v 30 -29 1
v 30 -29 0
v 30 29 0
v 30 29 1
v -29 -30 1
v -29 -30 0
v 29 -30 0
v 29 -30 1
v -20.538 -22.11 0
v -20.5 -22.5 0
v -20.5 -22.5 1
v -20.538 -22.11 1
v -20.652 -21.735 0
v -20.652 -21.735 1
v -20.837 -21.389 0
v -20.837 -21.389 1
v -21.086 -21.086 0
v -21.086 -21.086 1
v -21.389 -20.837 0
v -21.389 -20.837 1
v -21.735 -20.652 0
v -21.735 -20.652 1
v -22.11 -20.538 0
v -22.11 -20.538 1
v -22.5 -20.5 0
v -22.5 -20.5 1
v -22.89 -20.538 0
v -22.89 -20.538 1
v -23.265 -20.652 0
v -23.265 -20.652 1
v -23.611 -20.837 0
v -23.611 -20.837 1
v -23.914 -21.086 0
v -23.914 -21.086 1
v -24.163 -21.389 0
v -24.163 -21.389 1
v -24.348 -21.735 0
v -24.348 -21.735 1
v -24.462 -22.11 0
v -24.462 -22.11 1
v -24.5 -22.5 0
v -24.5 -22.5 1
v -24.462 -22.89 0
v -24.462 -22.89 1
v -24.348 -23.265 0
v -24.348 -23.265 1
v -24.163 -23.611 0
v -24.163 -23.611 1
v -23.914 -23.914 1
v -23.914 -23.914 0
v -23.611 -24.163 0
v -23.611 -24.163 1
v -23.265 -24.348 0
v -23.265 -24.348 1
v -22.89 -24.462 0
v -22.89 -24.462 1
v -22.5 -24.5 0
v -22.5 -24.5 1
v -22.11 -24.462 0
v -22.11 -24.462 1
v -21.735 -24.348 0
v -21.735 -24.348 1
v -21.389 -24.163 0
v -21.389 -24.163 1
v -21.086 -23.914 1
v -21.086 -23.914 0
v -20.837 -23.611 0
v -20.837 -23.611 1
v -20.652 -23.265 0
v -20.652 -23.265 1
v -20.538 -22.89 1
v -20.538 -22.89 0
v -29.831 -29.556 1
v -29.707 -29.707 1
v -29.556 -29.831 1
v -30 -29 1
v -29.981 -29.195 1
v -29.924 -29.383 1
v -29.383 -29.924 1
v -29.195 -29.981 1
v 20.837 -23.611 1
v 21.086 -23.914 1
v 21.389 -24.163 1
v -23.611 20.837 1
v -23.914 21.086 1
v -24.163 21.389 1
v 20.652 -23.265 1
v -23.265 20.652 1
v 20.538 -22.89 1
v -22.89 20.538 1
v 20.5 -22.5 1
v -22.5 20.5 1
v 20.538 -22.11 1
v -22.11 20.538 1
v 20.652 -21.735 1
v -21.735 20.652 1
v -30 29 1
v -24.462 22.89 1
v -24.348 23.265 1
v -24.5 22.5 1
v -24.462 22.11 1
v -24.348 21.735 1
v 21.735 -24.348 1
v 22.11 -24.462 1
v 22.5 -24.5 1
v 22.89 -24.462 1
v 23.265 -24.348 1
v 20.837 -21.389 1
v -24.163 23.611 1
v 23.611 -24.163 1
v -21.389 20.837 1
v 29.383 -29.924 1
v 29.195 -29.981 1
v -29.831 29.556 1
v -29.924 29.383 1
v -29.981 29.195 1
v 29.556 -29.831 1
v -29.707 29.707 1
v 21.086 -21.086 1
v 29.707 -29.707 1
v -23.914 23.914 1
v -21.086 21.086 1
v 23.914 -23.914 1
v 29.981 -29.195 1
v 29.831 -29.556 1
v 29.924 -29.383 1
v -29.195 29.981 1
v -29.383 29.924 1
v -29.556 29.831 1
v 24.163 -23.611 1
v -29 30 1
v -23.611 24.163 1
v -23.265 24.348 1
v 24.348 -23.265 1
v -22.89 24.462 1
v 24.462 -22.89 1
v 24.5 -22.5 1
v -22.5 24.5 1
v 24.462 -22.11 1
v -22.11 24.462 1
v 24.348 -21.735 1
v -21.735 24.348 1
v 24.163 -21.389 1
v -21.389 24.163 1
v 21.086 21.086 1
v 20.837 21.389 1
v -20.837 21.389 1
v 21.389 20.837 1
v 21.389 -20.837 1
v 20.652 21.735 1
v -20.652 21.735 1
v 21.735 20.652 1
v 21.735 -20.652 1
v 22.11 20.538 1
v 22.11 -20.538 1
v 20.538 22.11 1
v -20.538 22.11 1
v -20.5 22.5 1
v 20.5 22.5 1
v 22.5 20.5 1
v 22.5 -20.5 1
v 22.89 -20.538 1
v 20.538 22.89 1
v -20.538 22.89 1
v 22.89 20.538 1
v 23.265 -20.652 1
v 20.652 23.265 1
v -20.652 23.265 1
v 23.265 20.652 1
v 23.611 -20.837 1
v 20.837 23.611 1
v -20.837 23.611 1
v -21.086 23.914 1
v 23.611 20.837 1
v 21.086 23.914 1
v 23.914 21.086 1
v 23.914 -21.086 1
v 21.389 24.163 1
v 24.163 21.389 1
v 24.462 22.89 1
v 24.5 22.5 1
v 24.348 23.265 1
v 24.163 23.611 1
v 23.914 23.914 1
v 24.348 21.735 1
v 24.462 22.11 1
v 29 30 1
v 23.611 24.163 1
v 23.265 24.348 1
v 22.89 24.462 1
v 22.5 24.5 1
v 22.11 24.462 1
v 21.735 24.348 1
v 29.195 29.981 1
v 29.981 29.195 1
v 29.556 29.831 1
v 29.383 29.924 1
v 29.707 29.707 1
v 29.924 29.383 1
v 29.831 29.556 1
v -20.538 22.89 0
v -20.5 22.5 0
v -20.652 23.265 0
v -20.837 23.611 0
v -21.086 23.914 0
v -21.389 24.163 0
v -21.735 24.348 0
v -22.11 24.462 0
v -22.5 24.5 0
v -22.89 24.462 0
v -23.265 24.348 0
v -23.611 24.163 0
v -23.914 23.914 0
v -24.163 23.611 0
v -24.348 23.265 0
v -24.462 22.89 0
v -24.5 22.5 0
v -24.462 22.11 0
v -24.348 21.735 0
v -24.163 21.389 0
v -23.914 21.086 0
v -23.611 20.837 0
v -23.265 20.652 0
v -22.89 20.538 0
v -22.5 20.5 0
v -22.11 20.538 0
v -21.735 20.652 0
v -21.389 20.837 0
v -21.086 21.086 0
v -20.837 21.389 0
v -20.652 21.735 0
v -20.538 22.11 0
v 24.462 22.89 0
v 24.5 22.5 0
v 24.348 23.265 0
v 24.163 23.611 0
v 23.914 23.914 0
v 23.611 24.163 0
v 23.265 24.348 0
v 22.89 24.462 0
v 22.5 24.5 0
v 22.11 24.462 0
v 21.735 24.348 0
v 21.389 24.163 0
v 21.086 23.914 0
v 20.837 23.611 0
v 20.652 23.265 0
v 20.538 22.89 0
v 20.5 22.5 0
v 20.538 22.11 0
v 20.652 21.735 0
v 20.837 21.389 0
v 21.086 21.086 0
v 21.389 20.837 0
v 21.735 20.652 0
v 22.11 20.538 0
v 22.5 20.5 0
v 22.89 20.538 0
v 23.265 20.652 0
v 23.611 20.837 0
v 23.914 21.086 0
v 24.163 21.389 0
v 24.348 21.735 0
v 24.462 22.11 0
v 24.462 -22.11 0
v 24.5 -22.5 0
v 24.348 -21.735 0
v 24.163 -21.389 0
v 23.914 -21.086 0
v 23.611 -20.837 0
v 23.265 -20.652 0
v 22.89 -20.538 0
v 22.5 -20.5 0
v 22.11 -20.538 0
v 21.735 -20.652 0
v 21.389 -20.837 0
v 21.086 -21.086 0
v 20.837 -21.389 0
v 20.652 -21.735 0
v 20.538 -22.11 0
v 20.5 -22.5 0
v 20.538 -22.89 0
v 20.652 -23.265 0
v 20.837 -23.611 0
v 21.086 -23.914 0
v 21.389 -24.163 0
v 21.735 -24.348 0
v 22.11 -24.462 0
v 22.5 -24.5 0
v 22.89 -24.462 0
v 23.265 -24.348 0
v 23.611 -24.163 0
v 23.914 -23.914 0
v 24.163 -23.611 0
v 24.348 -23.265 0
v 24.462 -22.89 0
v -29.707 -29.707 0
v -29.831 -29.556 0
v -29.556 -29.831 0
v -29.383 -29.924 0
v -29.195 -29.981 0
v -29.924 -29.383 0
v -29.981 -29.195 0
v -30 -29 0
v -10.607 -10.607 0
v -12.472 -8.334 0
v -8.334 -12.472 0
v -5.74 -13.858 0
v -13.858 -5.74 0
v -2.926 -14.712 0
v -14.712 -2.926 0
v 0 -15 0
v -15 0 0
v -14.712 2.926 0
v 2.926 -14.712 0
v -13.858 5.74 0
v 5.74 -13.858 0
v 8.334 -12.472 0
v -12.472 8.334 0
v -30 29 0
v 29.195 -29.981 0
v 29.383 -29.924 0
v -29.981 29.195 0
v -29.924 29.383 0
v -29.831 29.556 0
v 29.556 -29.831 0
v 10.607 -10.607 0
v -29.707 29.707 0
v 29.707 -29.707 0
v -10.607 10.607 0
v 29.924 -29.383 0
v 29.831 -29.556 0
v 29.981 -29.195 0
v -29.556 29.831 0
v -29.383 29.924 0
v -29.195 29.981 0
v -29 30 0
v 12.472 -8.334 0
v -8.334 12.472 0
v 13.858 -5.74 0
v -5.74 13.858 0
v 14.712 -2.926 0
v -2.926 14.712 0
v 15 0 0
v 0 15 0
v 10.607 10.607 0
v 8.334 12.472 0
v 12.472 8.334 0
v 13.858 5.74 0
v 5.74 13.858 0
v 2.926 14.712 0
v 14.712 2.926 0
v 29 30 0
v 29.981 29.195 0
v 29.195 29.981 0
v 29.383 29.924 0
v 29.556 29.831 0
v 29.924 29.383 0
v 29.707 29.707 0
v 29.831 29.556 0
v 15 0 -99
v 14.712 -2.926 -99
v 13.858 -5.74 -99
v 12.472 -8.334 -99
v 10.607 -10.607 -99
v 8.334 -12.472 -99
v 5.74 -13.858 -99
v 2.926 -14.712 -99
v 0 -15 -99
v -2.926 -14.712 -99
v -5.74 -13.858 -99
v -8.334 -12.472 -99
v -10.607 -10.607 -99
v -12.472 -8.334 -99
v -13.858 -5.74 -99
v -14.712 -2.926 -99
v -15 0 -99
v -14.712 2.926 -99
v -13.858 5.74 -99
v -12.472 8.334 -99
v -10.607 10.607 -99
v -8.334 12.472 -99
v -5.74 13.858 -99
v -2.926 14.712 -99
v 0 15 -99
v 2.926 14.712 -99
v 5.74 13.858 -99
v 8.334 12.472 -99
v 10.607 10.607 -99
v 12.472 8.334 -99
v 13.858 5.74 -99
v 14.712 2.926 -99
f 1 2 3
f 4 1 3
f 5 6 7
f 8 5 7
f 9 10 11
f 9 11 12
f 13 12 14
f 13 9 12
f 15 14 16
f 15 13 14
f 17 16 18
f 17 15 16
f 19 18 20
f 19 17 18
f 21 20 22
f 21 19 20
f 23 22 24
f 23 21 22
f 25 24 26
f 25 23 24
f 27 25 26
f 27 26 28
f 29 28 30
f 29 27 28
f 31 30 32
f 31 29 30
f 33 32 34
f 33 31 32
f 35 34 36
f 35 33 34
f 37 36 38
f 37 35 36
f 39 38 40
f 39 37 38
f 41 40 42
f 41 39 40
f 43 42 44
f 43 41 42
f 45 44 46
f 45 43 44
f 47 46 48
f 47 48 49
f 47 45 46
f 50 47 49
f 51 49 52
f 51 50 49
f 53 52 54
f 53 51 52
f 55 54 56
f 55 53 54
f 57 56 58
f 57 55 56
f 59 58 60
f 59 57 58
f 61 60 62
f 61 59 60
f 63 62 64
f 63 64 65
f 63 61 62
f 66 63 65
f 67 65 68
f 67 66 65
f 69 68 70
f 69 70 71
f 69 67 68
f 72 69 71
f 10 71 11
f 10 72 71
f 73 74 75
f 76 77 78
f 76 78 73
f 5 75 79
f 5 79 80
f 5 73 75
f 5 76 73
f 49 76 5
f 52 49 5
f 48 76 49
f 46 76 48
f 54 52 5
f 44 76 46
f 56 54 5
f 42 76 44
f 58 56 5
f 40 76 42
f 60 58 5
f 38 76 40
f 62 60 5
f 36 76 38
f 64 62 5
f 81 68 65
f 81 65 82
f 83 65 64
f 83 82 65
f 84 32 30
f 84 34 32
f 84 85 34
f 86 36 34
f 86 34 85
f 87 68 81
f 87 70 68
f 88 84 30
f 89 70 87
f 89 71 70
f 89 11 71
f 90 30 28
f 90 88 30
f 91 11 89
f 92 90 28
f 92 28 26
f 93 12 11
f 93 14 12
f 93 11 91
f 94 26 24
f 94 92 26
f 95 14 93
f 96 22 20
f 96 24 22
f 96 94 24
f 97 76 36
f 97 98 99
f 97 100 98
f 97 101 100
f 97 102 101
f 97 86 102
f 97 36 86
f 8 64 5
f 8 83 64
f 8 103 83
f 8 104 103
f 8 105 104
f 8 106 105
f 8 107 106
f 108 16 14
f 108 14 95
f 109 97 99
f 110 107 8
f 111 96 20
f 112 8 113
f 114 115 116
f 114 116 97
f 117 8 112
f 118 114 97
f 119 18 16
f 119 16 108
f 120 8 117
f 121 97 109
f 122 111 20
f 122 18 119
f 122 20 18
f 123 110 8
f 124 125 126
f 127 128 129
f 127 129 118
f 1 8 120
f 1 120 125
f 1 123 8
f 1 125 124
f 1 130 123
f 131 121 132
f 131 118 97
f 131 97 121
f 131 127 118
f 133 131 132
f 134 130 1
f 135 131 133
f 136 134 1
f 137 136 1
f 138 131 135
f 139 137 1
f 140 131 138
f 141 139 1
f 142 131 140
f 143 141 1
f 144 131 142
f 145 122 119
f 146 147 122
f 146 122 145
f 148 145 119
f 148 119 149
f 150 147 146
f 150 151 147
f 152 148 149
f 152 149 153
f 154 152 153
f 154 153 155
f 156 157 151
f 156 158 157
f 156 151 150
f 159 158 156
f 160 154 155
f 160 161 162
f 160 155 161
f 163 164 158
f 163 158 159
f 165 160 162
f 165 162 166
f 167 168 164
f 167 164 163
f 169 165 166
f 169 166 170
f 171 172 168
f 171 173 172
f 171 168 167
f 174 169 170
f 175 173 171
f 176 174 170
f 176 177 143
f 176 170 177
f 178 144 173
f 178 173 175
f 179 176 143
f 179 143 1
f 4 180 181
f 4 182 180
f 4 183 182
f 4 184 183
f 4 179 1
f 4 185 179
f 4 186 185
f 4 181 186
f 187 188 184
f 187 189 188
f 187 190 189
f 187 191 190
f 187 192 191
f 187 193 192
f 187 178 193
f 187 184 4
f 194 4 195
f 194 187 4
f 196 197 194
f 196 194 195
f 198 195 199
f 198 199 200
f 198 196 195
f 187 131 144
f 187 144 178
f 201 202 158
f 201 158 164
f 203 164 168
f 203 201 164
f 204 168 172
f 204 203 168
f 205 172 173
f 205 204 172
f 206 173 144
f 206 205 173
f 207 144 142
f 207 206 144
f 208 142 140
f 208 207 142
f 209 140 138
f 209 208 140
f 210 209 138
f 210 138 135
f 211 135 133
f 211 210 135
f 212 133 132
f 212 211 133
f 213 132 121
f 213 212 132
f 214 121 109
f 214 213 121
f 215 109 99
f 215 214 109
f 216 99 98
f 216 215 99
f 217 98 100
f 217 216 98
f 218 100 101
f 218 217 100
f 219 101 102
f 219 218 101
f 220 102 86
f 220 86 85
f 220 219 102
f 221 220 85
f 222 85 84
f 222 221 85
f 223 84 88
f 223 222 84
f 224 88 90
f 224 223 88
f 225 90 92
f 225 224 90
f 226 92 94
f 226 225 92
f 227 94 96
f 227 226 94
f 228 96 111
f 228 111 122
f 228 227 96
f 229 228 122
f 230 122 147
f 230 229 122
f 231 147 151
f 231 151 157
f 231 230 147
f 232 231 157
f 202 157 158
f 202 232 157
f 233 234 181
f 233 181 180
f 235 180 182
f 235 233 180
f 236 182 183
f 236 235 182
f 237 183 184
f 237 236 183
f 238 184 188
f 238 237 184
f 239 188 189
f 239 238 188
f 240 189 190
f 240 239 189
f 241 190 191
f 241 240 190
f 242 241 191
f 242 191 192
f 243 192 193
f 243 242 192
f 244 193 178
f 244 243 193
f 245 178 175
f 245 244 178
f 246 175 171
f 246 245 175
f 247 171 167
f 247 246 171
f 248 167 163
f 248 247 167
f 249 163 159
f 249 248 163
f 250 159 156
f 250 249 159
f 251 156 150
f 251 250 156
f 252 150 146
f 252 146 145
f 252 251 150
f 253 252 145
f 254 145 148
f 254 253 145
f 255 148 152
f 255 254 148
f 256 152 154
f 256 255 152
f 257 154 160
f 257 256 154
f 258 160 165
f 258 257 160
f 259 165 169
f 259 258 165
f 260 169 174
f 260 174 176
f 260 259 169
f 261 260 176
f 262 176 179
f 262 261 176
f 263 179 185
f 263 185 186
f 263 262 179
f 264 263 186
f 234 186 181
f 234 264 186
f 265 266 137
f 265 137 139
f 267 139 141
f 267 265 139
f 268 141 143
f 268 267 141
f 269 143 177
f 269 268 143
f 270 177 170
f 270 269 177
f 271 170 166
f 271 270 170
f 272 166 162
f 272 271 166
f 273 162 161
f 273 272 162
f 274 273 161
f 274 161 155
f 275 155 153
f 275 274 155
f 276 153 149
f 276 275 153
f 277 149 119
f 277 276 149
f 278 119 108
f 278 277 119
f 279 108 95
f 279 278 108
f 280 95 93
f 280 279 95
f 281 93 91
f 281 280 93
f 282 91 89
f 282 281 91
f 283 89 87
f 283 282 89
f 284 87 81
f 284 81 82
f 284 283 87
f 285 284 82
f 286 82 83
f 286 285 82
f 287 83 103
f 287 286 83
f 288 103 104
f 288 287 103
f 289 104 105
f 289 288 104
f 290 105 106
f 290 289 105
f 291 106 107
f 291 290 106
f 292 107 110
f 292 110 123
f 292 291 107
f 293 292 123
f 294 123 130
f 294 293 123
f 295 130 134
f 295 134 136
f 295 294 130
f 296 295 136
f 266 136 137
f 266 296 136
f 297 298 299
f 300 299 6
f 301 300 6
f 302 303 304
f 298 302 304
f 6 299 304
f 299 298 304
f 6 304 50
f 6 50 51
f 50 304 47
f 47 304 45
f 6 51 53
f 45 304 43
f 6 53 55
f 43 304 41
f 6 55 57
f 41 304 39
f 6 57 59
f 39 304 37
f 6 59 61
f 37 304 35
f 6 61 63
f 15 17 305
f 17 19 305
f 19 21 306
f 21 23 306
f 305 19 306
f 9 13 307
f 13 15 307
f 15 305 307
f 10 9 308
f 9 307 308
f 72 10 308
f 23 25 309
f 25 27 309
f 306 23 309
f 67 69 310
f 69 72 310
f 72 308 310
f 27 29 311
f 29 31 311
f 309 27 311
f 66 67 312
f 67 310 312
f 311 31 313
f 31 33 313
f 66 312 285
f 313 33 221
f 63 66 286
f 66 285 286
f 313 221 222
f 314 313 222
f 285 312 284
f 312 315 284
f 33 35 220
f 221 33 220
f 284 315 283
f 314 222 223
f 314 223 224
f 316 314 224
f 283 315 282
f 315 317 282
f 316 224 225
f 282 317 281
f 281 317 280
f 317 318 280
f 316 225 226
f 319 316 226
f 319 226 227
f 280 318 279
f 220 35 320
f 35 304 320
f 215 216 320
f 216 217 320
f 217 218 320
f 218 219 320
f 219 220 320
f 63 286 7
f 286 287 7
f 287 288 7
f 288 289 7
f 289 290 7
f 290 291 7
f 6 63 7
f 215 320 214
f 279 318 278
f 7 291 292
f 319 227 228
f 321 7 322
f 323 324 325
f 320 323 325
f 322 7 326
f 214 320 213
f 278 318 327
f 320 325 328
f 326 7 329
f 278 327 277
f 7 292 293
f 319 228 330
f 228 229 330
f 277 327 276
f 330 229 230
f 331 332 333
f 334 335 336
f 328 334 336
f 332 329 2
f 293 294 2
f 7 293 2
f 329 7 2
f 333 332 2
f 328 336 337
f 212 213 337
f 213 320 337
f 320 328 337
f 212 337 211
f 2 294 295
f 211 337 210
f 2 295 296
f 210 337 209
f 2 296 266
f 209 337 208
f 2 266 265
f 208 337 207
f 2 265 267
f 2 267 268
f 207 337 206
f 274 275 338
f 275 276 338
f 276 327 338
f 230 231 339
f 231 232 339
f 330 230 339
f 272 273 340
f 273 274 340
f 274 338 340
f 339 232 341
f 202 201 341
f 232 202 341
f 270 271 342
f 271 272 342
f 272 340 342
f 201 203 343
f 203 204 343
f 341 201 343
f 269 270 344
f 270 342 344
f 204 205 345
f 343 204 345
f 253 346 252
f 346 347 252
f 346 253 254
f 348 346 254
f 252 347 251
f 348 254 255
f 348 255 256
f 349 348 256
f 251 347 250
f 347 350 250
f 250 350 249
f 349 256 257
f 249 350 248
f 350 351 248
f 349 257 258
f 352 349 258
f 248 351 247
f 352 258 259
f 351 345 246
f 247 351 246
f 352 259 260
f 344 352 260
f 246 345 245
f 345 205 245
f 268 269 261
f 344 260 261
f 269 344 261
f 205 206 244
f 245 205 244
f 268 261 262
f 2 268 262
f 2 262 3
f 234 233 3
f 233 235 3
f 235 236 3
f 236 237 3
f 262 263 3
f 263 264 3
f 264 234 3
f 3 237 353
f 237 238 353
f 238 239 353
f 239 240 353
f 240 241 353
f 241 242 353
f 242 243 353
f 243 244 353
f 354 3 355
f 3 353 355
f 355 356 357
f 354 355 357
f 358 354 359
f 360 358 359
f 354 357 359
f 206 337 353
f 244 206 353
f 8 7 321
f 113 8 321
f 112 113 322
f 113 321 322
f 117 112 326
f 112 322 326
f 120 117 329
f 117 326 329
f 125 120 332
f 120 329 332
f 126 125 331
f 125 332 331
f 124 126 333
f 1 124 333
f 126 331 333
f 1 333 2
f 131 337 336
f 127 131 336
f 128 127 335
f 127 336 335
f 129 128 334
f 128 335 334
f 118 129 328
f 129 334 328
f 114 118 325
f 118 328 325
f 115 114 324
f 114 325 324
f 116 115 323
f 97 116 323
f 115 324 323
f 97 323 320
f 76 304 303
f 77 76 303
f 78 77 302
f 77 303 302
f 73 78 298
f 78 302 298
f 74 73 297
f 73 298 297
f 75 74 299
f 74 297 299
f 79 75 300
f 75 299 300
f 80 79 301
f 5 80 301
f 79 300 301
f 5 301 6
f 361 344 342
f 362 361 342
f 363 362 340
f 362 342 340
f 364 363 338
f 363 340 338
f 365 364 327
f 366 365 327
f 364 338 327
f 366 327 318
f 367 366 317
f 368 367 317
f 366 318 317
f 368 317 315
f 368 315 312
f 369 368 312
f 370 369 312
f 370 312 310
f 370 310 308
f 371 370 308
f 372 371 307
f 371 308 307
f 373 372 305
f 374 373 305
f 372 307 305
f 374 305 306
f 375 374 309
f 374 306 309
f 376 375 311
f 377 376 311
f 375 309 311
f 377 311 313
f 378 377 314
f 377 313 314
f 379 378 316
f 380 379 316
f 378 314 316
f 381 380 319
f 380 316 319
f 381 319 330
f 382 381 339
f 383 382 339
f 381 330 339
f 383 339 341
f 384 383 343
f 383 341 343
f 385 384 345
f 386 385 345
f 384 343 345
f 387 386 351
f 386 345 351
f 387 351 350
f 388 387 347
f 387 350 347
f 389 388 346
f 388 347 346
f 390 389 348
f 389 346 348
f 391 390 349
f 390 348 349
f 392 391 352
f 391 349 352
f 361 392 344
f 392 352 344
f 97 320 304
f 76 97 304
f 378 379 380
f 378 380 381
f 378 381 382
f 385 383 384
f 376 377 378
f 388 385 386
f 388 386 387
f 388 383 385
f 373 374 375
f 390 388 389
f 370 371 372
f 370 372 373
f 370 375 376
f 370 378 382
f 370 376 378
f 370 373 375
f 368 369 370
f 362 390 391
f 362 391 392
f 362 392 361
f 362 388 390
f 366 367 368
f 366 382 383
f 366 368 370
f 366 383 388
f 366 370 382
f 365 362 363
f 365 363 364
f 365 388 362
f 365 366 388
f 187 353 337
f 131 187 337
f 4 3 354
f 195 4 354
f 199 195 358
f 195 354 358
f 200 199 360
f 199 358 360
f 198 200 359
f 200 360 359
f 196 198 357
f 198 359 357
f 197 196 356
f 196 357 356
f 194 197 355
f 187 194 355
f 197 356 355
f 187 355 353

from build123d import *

# Parameters (mm, degrees)
F0_R     = 2
F1_DEPTH = 1
F2_R     = 15
F3_DEPTH = 99


with BuildPart() as f1:
    # F0 (on Top) → F1 (new body)
    with BuildSketch(Plane.XY):
        with BuildLine():
            ThreePointArc((-30, -29), (-29.707107, -29.707107), (-29, -30))
            Line((-29, -30), (29, -30))
            ThreePointArc((29, -30), (29.707107, -29.707107), (30, -29))
            Line((30, -29), (30, 29))
            ThreePointArc((30, 29), (29.707107, 29.707107), (29, 30))
            Line((29, 30), (-29, 30))
            ThreePointArc((-29, 30), (-29.707107, 29.707107), (-30, 29))
            Line((-30, 29), (-30, -29))
        make_face()
        with Locations((-22.5, -22.5)):
            Circle(F0_R, mode=Mode.SUBTRACT)
        with Locations((22.5, -22.5)):
            Circle(F0_R, mode=Mode.SUBTRACT)
        with Locations((-22.5, 22.5)):
            Circle(F0_R, mode=Mode.SUBTRACT)
        with Locations((22.5, 22.5)):
            Circle(F0_R, mode=Mode.SUBTRACT)
    extrude(amount=F1_DEPTH)

    # F2 (on face) → F3 (join)
    with BuildSketch(Plane(origin=(0, 0, 0), x_dir=(1, 0, 0), z_dir=(0, 0, -1))):
        Circle(F2_R)
    extrude(amount=F3_DEPTH)


solid = f1.part
